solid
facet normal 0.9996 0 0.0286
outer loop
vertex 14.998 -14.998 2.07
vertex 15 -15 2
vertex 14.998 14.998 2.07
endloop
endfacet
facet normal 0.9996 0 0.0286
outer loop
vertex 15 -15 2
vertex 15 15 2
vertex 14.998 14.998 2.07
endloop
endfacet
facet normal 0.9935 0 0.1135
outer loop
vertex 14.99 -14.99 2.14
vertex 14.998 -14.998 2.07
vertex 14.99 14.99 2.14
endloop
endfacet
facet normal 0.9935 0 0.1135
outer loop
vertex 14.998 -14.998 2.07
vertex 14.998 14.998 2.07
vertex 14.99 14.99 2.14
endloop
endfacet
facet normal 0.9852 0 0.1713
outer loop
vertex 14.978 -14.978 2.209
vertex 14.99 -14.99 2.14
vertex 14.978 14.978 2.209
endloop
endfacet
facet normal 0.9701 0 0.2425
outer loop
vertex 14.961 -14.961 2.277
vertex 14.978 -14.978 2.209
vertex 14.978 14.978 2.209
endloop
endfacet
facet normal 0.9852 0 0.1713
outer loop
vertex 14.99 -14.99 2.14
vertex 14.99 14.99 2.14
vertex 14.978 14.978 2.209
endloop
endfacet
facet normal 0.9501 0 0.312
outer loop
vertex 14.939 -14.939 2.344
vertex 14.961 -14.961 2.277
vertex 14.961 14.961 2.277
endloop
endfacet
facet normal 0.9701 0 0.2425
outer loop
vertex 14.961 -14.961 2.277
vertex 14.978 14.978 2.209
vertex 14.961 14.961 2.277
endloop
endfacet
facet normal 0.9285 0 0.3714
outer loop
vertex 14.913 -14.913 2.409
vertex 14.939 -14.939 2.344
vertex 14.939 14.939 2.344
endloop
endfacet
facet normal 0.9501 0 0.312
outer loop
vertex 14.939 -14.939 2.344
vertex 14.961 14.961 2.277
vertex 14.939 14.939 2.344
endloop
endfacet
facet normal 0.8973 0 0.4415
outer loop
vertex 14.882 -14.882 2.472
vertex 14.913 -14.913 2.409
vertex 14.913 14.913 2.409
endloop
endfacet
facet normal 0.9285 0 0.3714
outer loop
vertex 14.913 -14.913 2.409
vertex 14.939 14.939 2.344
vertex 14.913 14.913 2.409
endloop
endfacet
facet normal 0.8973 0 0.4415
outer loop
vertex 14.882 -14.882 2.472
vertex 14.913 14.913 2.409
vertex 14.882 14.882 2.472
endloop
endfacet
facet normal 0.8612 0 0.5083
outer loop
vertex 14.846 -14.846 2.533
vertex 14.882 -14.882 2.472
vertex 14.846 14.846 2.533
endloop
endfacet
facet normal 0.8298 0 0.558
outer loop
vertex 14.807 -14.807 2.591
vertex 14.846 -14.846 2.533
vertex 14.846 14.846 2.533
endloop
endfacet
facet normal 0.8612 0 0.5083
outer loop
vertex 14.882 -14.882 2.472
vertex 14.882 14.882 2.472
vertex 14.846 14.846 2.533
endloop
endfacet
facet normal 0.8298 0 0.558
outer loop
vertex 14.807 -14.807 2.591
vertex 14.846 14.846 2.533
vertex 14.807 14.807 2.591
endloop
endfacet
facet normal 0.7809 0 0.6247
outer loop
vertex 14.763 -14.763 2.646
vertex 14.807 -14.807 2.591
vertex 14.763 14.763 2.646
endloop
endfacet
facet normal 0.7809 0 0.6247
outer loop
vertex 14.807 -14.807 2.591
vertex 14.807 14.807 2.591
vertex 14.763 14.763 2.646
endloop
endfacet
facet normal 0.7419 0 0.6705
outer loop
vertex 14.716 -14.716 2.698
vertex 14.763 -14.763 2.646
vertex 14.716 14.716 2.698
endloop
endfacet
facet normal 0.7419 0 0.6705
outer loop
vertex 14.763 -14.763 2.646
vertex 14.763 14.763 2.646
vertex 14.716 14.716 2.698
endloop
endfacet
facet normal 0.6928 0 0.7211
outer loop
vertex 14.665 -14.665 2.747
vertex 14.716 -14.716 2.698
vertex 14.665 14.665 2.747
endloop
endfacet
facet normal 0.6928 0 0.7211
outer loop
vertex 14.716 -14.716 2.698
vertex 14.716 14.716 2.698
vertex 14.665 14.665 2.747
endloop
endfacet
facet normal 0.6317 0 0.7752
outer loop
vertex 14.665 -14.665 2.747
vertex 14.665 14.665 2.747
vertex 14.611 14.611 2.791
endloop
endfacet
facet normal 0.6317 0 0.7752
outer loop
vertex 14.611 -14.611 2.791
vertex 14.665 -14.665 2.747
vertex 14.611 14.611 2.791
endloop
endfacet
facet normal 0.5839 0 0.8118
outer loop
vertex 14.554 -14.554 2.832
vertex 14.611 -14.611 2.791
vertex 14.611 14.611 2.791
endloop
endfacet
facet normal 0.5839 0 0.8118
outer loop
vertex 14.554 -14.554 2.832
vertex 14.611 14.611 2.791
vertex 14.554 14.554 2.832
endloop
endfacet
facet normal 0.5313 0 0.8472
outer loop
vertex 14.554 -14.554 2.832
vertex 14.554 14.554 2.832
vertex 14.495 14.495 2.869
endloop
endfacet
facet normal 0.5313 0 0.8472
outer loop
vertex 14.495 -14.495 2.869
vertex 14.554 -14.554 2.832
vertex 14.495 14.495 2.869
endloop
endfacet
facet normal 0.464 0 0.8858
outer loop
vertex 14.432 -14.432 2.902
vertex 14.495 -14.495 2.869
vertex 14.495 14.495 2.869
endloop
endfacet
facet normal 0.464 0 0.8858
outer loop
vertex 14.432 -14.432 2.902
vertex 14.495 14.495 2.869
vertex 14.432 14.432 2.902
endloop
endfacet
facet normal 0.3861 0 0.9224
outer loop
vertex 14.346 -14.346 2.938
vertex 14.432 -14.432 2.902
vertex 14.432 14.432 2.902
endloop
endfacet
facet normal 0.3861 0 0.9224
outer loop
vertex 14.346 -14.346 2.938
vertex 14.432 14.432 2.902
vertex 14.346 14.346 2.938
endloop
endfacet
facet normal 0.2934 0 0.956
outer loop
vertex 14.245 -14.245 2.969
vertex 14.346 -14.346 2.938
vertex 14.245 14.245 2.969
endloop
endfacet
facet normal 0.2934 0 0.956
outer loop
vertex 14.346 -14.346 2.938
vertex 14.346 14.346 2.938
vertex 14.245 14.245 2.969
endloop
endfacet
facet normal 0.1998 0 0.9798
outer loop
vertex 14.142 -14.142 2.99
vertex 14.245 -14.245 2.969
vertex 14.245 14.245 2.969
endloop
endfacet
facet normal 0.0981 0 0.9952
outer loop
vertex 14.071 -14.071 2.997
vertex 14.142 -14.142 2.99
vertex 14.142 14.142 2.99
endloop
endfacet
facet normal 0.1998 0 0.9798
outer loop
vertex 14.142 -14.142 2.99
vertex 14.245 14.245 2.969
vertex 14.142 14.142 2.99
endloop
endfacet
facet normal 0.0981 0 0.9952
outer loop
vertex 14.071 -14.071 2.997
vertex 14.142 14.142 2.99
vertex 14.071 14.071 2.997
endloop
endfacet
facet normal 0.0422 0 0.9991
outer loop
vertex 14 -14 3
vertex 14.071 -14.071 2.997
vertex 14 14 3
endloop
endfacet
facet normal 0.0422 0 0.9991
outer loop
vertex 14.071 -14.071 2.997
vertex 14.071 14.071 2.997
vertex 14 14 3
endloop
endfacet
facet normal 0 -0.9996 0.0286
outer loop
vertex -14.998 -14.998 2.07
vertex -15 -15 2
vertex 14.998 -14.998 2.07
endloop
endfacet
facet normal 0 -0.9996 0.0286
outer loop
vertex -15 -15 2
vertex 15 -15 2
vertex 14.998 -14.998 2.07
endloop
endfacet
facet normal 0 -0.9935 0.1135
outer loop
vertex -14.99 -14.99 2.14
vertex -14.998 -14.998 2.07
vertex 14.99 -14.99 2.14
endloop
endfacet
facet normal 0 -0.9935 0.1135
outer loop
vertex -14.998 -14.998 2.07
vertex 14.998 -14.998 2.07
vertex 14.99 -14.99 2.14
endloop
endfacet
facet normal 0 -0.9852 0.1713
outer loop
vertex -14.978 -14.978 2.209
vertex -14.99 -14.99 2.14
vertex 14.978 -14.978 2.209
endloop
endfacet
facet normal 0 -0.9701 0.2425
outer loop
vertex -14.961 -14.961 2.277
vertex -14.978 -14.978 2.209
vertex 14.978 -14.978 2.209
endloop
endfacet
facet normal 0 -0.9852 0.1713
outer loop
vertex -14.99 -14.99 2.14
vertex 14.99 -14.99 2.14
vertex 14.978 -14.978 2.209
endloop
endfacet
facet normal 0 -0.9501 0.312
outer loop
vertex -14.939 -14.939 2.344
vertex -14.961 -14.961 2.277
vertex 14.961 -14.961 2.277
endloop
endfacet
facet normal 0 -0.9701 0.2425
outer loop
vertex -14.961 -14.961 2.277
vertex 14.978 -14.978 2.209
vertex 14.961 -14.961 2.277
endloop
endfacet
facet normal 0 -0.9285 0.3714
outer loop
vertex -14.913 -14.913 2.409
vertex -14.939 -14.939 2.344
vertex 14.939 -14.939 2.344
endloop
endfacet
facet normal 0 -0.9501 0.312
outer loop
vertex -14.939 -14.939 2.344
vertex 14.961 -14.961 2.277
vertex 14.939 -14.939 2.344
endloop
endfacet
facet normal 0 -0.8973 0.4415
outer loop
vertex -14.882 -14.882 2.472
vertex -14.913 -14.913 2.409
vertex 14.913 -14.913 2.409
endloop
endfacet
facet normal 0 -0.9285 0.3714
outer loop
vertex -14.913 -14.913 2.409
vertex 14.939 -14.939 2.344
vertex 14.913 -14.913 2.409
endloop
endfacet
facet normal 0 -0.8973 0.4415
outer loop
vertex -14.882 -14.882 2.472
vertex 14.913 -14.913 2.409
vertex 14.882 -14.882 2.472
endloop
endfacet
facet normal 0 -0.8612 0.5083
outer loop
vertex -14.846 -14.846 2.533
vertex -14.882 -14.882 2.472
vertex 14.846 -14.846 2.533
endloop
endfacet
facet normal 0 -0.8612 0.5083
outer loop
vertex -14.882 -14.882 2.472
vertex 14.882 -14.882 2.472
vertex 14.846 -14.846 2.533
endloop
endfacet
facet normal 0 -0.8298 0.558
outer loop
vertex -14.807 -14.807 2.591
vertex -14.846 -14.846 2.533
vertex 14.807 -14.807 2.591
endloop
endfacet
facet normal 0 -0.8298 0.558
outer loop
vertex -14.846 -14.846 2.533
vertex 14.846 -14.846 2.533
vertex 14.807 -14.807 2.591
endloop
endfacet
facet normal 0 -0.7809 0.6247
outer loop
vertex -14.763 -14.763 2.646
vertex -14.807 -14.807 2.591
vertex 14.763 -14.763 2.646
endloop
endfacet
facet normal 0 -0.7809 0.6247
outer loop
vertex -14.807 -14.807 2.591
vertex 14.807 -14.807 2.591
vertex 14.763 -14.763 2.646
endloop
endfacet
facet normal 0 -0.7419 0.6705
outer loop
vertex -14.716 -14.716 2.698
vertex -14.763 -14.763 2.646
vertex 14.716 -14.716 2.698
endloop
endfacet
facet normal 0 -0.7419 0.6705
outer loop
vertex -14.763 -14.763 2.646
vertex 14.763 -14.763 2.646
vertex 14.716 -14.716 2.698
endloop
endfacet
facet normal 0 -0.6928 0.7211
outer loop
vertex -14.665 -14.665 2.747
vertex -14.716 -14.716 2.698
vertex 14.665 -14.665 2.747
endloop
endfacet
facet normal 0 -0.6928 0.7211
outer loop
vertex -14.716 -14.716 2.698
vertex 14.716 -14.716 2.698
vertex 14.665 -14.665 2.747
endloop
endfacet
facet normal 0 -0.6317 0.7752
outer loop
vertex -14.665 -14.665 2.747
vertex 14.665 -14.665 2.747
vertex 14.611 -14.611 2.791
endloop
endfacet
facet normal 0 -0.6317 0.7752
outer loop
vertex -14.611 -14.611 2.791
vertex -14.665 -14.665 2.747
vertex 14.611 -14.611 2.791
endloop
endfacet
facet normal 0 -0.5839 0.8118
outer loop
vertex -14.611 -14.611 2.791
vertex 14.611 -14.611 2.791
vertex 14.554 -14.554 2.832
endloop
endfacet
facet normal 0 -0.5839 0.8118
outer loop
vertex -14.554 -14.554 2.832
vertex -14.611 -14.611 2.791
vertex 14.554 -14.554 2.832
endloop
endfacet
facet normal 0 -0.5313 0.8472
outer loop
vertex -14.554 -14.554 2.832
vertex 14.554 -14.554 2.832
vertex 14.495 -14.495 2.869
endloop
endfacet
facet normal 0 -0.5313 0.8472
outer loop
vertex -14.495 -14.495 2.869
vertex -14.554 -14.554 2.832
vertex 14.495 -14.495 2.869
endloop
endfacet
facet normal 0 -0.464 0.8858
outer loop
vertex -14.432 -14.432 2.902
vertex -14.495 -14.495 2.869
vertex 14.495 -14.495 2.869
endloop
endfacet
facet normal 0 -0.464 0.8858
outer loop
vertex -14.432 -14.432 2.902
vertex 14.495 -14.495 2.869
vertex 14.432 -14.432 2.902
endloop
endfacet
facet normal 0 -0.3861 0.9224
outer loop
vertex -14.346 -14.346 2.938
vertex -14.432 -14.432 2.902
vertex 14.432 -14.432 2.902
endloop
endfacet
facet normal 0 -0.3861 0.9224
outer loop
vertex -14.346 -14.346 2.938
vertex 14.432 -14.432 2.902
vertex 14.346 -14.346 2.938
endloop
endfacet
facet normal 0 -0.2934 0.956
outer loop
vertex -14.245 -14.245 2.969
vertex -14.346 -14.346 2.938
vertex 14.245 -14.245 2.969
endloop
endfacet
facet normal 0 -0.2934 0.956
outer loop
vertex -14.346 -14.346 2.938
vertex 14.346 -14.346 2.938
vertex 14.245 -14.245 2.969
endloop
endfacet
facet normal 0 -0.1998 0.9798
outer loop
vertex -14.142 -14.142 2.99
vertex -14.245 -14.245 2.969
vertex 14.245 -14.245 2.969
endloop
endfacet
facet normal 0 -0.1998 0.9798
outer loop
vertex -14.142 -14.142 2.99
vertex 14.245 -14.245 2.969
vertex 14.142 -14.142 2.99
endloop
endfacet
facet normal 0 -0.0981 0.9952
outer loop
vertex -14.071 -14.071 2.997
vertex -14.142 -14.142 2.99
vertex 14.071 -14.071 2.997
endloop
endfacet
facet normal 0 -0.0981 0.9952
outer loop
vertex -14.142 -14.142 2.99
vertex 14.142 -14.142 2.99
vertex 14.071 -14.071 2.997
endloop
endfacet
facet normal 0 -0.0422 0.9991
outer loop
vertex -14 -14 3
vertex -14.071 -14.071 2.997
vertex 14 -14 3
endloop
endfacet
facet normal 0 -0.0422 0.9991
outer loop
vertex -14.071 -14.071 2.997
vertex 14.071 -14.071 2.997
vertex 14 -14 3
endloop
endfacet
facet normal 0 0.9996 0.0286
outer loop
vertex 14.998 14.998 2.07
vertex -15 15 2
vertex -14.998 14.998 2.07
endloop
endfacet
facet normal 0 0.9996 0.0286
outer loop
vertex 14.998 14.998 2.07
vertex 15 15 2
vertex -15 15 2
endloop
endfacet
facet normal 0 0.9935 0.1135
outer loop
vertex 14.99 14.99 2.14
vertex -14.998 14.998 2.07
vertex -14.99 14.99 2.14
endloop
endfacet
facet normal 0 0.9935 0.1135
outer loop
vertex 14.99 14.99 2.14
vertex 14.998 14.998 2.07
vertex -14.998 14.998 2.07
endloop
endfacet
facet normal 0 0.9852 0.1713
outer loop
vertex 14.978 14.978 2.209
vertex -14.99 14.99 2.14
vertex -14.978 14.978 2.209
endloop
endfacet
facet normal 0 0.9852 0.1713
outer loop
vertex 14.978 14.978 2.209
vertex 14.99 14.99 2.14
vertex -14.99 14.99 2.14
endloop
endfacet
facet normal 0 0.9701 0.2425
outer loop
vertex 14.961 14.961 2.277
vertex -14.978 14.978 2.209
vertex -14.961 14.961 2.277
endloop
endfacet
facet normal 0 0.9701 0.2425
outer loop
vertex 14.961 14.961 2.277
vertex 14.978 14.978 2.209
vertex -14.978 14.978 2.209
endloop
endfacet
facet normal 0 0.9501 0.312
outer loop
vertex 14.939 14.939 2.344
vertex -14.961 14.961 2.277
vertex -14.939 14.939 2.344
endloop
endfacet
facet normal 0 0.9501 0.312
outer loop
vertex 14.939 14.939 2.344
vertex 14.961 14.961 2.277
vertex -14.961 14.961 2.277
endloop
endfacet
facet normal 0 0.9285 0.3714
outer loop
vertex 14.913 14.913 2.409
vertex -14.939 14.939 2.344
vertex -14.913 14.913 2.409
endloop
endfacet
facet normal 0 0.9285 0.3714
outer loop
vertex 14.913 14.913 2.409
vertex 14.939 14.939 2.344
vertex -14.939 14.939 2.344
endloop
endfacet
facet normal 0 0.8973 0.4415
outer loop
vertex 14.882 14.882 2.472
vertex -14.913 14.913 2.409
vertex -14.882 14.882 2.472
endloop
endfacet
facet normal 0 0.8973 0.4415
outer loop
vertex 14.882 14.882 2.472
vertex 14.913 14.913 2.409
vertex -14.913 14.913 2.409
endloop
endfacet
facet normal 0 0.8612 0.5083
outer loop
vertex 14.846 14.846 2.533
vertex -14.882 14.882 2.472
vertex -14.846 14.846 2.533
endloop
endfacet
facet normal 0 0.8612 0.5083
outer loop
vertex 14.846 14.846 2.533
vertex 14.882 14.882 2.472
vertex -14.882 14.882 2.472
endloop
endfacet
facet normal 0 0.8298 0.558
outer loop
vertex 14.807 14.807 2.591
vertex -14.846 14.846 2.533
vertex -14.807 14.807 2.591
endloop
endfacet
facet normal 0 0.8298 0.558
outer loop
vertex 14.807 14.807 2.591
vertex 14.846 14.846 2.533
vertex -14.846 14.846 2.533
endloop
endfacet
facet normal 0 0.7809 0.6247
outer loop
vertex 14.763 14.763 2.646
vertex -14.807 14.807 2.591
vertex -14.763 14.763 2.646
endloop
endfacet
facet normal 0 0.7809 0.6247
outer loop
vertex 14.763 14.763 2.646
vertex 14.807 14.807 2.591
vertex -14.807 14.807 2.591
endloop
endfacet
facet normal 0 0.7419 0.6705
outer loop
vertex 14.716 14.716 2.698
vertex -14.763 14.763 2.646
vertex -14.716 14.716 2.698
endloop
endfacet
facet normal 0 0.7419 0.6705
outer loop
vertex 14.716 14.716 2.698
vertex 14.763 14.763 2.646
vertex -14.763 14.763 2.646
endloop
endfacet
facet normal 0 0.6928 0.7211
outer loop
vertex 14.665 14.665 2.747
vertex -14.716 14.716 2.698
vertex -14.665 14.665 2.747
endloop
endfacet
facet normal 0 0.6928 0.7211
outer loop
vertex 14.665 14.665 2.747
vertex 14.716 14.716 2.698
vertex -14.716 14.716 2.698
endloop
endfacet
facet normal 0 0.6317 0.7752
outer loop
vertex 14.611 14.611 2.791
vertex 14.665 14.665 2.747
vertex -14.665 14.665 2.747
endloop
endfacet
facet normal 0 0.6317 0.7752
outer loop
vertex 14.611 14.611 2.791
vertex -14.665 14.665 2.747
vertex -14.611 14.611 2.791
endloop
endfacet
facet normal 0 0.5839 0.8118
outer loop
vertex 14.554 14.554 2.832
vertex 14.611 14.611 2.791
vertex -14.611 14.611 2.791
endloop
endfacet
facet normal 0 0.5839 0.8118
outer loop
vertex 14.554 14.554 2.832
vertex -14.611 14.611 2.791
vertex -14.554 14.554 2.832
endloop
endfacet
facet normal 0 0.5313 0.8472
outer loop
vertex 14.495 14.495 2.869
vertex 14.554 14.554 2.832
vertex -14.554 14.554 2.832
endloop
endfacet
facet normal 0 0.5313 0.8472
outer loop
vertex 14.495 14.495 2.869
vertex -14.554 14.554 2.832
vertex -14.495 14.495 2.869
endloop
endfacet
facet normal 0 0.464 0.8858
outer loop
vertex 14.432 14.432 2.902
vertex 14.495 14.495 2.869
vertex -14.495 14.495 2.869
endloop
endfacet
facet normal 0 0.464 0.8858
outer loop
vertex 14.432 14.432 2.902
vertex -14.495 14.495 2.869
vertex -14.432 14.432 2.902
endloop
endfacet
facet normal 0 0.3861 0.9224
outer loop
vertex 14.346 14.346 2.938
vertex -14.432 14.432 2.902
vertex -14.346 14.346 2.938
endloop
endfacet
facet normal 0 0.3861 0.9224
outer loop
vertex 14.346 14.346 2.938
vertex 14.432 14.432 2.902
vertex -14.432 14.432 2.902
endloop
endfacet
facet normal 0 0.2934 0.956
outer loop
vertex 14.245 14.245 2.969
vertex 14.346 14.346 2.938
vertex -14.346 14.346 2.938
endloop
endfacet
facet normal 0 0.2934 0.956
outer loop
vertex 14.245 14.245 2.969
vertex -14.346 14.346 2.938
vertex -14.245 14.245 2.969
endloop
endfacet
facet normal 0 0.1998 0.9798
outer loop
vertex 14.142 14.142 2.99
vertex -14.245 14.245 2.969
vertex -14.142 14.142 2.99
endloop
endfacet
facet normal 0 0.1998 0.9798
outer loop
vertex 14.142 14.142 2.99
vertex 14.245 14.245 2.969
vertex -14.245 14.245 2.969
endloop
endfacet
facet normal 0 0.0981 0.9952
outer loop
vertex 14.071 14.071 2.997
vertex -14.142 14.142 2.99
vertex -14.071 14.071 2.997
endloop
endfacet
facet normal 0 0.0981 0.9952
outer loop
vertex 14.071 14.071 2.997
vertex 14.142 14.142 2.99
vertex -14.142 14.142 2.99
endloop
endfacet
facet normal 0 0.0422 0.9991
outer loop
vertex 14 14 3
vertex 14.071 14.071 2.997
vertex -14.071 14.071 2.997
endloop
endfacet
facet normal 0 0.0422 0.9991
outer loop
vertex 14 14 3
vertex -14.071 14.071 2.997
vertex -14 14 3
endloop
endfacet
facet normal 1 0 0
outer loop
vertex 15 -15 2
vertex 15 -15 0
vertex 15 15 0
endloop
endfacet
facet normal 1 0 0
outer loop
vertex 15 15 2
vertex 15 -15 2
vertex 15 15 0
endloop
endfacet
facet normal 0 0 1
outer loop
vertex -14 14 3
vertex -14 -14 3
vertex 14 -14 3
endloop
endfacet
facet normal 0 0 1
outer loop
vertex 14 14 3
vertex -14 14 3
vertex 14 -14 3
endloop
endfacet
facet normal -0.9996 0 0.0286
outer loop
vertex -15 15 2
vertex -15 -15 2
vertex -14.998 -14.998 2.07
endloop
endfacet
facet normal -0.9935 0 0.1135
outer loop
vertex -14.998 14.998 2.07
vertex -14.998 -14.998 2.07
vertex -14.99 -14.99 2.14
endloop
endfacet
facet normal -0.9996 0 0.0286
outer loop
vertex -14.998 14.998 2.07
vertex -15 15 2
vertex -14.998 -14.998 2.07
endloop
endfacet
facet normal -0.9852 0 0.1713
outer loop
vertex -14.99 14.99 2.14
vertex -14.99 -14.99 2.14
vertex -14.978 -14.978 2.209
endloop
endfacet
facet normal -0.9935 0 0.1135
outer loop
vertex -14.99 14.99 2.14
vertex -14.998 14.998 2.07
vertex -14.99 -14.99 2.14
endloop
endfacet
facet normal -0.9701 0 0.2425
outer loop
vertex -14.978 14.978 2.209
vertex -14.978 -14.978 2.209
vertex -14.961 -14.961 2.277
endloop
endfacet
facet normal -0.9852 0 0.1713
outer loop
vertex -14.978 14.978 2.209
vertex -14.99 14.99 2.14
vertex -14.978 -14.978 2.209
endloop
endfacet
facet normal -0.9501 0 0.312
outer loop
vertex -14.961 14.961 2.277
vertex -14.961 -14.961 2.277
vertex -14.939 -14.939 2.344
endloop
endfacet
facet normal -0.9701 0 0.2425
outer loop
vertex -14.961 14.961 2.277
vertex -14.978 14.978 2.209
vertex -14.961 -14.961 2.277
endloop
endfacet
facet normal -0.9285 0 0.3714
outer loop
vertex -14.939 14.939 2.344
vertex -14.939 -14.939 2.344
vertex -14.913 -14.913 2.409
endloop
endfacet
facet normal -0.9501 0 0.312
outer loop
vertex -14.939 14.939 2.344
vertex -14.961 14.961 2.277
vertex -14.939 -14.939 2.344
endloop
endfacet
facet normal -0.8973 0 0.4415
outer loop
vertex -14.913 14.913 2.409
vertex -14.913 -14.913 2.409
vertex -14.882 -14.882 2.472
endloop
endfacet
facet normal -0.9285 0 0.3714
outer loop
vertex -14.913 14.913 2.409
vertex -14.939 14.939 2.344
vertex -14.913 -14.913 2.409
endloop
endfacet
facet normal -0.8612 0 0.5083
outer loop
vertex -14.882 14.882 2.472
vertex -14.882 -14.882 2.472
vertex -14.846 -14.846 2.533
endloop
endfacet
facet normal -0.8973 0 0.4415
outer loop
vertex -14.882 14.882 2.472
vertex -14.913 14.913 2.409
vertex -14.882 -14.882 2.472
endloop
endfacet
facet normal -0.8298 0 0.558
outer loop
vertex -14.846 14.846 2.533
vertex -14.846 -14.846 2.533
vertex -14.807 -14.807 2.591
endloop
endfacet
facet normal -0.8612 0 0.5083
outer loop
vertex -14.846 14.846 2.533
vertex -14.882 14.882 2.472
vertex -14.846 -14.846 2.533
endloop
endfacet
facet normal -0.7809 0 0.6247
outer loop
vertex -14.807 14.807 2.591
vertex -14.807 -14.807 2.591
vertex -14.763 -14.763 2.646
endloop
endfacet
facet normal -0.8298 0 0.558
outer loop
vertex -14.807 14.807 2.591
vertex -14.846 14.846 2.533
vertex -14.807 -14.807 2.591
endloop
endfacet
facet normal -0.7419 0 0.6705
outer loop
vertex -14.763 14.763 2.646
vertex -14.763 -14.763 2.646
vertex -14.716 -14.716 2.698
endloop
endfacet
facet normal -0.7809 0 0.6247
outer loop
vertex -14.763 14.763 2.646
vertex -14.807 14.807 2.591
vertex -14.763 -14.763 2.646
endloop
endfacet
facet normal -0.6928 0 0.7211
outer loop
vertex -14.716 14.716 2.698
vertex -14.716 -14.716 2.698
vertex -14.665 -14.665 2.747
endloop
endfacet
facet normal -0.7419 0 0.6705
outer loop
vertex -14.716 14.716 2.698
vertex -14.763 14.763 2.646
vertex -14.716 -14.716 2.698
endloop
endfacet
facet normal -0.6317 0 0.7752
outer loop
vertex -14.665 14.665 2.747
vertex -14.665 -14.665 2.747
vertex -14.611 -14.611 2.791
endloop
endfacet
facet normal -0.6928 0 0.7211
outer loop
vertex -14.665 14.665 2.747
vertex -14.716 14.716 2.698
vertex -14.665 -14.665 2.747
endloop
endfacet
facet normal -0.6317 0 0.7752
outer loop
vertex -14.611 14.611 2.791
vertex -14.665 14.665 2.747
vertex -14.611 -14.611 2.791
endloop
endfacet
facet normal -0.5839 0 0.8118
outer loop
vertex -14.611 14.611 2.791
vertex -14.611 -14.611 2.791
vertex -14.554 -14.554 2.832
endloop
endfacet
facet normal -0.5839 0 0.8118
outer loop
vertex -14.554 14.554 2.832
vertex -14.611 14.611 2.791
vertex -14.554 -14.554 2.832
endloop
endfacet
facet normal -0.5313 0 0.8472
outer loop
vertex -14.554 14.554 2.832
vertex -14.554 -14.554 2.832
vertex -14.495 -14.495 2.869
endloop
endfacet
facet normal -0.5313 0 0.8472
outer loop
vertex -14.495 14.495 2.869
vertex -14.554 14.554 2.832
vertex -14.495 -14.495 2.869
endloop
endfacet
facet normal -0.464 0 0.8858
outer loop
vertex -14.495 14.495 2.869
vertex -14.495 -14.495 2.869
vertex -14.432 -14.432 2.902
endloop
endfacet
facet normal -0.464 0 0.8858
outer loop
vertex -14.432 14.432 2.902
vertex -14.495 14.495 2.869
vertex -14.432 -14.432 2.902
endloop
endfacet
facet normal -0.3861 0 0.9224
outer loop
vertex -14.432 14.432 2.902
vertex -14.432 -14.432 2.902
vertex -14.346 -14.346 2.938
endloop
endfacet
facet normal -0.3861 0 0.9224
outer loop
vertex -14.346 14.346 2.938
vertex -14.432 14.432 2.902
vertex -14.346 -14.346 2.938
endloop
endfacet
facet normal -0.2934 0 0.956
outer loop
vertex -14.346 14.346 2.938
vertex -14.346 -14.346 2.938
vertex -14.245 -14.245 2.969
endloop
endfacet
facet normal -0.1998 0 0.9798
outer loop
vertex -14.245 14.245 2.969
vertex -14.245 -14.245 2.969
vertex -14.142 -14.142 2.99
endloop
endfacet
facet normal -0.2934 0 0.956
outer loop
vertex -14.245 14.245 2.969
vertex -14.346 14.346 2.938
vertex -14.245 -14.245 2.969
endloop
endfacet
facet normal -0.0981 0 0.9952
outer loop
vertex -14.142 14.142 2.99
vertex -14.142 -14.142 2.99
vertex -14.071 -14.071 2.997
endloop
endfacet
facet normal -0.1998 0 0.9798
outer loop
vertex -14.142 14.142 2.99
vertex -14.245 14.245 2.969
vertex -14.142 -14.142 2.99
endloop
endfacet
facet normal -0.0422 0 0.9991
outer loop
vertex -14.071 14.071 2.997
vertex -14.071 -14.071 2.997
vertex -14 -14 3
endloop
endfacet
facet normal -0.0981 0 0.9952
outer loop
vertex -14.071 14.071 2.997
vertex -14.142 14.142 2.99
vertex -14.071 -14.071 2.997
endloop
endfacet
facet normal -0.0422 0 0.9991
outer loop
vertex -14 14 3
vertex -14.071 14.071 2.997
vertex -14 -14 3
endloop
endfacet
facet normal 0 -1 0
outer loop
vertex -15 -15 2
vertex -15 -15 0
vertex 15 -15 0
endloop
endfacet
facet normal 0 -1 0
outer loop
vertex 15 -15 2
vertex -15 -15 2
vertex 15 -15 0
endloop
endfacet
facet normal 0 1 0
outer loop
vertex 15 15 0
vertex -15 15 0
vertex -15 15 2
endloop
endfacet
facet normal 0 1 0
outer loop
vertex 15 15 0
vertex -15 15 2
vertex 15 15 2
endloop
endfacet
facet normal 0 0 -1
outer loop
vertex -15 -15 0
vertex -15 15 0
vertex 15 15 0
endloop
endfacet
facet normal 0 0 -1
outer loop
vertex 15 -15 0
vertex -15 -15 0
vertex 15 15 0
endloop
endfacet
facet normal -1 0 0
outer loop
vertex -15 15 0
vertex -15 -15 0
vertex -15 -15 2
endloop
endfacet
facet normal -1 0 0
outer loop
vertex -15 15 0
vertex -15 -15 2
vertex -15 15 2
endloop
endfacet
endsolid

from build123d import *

# Parameters (mm, degrees)
SKETCH_W  = 30
SKETCH_H  = 30
PAD_DEPTH = 3
FILLET_R  = 1


with BuildPart() as part:
    # Sketch → Pad (new body)
    with BuildSketch(Plane.XY):
        Rectangle(SKETCH_W, SKETCH_H)
    extrude(amount=PAD_DEPTH)

    # Fillet
    fillet_edges = [part.edges().sort_by_distance(p)[0] for p in [
        (15, 0, 3),
        (0, -15, 3),
        (-15, 0, 3),
        (0, 15, 3),
    ]]
    fillet(fillet_edges, radius=FILLET_R)


solid = part.part
